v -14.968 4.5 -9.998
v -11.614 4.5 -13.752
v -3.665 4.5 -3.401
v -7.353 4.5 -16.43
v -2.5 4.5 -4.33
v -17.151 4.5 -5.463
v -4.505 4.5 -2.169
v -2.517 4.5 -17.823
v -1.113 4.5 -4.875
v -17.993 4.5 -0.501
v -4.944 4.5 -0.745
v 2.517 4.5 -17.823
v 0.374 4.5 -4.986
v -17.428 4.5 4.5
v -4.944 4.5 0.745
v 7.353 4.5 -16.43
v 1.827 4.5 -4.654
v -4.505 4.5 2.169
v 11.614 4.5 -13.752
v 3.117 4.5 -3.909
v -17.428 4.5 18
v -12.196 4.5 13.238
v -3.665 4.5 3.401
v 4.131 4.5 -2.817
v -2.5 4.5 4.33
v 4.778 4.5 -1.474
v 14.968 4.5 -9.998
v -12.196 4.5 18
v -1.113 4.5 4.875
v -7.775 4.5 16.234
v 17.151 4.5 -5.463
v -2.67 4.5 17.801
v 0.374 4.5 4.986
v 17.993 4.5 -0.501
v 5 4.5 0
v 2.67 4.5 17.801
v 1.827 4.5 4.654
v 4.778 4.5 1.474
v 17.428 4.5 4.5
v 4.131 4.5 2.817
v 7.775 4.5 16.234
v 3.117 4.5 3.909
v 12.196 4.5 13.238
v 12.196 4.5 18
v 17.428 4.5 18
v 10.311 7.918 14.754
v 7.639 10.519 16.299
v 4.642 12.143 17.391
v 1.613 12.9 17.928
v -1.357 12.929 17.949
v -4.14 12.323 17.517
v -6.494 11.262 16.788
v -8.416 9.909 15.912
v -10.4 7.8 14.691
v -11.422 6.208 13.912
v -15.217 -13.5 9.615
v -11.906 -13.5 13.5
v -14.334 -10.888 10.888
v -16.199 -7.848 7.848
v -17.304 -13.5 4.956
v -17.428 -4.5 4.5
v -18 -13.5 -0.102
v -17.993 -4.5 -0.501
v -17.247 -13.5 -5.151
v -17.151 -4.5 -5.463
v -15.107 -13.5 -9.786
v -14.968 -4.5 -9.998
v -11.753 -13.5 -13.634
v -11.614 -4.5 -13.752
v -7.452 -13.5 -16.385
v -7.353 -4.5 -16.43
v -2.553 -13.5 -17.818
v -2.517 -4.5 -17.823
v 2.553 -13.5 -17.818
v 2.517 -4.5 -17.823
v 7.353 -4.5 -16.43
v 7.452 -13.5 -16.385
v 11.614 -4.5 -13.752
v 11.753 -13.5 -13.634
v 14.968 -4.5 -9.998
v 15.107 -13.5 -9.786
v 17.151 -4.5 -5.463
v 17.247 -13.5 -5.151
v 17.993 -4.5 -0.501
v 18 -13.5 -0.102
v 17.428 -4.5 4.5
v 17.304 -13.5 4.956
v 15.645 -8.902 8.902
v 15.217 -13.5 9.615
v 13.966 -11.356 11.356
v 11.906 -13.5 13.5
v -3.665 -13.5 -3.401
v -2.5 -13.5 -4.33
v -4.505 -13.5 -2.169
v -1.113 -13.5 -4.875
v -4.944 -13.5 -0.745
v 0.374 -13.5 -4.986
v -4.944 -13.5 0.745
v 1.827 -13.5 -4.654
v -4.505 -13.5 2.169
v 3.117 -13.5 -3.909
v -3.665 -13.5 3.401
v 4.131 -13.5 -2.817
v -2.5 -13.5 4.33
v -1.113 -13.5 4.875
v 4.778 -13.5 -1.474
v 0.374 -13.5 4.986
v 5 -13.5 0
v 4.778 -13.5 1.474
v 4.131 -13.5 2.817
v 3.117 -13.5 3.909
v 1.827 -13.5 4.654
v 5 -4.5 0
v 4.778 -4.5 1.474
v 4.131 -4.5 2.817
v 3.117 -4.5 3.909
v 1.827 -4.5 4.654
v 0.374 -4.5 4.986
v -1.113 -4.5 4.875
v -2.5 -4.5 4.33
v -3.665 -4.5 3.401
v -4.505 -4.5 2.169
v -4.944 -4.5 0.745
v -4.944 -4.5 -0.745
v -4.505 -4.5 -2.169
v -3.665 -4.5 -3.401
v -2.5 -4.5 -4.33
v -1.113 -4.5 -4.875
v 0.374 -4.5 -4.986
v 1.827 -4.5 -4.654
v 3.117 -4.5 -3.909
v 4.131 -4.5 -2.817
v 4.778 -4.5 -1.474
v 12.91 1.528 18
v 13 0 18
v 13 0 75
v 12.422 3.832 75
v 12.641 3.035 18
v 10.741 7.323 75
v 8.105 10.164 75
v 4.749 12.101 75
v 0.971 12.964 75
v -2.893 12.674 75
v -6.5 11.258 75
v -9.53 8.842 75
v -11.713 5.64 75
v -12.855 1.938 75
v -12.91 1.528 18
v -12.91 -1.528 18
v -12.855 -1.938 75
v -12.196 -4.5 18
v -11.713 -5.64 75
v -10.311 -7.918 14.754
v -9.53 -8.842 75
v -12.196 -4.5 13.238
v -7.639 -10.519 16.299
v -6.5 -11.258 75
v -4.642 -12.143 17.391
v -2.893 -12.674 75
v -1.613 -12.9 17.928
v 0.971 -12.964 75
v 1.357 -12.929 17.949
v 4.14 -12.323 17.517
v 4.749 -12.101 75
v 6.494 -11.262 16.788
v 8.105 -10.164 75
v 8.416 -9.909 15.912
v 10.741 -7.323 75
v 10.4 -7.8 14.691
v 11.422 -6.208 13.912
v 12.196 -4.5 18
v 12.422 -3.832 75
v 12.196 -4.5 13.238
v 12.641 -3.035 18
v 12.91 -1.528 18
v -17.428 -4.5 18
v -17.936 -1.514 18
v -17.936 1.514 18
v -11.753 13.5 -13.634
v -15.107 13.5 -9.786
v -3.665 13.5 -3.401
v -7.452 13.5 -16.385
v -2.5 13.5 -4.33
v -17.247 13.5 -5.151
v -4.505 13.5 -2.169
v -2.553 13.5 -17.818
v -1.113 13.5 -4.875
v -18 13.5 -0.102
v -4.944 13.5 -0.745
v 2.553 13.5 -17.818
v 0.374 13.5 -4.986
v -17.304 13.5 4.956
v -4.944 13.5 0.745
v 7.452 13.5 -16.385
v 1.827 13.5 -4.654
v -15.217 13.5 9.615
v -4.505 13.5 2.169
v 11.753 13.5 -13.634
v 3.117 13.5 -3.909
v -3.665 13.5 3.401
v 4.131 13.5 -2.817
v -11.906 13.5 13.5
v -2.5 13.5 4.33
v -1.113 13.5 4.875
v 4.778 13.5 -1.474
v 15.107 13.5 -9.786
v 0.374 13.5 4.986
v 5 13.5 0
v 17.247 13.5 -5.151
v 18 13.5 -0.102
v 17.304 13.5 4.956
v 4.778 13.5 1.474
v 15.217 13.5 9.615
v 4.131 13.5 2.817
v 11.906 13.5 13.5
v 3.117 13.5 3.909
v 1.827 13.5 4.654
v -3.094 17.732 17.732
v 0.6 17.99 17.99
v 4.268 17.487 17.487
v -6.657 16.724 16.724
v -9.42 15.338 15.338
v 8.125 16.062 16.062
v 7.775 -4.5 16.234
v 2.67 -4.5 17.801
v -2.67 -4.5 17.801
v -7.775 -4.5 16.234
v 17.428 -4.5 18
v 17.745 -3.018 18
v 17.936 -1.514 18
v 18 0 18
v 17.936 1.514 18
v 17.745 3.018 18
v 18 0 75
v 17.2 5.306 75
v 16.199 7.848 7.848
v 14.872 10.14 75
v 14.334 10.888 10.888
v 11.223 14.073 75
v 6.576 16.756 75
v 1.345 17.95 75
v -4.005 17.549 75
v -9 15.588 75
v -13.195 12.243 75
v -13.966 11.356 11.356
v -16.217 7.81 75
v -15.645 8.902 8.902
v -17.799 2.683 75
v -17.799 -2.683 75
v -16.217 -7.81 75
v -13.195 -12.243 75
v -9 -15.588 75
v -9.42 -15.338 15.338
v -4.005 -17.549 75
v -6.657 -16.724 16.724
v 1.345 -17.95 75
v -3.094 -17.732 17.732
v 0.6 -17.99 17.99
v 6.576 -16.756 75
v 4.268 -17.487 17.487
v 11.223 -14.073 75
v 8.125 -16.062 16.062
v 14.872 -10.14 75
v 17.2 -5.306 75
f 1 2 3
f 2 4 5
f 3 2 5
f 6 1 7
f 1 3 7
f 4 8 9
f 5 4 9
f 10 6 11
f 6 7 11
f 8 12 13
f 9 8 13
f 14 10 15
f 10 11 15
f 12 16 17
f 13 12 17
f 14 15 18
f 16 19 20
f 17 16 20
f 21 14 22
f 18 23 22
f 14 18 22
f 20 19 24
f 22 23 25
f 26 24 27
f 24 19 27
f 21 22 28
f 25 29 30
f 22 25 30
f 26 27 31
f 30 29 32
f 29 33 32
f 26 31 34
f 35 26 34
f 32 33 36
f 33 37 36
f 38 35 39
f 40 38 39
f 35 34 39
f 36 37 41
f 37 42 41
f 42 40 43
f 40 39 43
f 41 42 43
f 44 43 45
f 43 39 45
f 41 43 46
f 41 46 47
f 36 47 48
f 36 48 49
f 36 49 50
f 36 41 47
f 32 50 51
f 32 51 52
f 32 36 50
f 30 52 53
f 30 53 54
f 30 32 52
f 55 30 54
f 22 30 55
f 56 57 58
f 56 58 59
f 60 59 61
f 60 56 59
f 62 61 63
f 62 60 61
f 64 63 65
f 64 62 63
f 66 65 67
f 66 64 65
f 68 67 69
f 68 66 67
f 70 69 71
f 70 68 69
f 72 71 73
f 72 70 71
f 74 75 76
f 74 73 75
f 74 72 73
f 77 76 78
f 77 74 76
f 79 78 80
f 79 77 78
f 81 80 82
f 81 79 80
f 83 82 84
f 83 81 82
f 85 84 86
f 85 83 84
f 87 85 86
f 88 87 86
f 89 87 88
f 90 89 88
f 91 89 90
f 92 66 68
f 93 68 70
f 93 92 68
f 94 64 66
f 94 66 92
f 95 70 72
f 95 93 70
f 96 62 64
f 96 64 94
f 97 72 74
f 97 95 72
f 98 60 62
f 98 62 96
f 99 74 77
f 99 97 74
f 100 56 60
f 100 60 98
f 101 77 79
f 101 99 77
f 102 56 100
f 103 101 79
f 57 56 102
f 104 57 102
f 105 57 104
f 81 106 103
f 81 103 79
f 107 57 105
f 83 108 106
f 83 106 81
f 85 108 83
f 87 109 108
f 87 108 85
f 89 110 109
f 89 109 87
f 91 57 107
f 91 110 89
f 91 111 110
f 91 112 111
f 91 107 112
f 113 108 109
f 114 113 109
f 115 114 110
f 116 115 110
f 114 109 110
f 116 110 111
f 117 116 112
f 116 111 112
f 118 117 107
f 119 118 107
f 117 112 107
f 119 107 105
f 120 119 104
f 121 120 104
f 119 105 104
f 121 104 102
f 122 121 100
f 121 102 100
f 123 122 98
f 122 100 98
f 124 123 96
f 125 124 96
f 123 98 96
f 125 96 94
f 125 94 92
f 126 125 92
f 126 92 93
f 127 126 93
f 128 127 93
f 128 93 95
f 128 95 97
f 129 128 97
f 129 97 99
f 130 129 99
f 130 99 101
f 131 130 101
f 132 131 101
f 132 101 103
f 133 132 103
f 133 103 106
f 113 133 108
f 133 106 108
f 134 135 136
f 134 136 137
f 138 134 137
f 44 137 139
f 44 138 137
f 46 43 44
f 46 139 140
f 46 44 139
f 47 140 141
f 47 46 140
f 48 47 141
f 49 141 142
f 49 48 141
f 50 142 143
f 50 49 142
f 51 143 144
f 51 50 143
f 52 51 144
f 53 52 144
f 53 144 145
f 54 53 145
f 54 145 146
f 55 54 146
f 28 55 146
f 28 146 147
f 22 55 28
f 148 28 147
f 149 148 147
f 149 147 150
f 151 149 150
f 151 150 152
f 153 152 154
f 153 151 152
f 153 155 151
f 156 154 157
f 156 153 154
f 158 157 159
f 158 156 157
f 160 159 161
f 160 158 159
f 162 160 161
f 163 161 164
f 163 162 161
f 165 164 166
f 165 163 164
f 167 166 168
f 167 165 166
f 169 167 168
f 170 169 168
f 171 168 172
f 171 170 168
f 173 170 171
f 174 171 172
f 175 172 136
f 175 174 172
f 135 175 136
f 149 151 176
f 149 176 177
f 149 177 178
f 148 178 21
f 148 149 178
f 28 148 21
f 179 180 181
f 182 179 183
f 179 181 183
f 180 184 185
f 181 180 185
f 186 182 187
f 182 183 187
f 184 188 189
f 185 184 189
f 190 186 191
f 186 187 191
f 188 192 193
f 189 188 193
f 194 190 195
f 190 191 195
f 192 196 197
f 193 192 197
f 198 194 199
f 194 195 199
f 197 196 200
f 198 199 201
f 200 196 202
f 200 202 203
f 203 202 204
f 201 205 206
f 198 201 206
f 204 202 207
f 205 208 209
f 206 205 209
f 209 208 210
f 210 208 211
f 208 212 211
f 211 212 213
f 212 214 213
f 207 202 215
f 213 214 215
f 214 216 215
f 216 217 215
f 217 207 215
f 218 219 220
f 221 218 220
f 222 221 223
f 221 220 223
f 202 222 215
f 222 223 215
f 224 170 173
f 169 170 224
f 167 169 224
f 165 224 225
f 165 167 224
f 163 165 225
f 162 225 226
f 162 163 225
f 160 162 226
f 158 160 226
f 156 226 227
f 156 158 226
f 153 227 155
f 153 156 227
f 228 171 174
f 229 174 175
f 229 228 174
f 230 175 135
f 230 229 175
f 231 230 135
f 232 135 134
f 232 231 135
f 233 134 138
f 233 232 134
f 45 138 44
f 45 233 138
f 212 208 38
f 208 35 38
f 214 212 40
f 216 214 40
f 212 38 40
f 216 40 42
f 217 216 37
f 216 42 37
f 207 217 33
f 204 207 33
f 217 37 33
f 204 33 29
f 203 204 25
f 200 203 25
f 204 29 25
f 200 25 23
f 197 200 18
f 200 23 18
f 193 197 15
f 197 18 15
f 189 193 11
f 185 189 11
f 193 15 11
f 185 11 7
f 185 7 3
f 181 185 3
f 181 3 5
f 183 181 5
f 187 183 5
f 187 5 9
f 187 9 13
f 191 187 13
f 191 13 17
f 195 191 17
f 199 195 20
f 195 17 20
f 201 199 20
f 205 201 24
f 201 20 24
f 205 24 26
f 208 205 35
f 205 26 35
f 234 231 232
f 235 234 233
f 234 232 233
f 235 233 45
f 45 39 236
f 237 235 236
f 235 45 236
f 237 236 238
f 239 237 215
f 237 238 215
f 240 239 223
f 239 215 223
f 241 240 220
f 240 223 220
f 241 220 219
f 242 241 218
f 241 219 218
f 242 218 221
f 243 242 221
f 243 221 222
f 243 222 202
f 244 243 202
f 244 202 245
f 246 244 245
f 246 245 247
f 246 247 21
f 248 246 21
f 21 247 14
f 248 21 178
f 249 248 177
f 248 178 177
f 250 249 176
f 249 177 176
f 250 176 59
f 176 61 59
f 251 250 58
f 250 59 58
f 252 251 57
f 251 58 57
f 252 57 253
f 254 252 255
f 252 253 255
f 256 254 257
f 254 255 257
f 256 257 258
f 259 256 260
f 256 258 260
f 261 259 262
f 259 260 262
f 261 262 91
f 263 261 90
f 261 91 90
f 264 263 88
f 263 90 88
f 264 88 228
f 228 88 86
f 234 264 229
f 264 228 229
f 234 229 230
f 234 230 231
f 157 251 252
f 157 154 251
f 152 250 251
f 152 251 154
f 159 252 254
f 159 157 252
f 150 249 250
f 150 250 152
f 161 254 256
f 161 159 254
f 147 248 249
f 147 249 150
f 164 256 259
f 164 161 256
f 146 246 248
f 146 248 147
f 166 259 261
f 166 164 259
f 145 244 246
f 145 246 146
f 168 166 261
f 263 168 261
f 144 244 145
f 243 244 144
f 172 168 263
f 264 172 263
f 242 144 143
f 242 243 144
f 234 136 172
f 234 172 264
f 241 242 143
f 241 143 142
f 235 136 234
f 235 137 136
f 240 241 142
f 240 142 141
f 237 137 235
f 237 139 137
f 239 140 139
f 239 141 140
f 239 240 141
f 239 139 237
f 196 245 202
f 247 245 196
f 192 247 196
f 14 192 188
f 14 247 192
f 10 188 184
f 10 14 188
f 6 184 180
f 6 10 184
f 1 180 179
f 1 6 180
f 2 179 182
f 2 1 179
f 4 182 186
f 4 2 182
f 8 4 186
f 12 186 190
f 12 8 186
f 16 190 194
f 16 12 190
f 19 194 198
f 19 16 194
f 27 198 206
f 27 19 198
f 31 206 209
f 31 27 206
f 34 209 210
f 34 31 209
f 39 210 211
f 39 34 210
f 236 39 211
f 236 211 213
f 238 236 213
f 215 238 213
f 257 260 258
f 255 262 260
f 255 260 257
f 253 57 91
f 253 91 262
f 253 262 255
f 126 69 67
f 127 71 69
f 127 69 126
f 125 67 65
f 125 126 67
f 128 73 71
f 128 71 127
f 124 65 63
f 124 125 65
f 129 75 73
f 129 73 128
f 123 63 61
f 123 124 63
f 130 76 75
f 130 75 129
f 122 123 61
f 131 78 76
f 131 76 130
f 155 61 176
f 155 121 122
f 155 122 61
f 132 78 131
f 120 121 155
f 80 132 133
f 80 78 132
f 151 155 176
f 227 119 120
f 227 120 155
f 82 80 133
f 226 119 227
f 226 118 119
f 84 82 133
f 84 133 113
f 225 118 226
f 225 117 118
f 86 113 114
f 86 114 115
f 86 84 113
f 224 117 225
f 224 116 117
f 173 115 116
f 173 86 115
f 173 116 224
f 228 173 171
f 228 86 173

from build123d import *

# Parameters (mm, degrees)
F0_R     = 18
F0_R_2   = 13
F1_DEPTH = 75
F2_R     = 18
F3_DEPTH = 13.5
F4_W     = 9
F4_H     = 36
F5_DEPTH = 20
F6_R     = 5
F7_DEPTH = 20
F9_DEPTH = 14.5


with BuildPart() as f1:
    # F0 (on Top) → F1 (new body)
    with BuildSketch(Plane.XY):
        Circle(F0_R)
        Circle(F0_R_2, mode=Mode.SUBTRACT)
    extrude(amount=F1_DEPTH)

    # F2 (on Front) → F3 (join, symmetric)
    with BuildSketch(Plane.XZ):
        Circle(F2_R)
    extrude(amount=F3_DEPTH, both=True)

    # F4 (on Right) → F5 (cut, symmetric)
    with BuildSketch(Plane.YZ):
        Rectangle(F4_W, F4_H)
    extrude(amount=F5_DEPTH, both=True, mode=Mode.SUBTRACT)

    # F6 (on Front) → F7 (cut, symmetric)
    with BuildSketch(Plane.XZ):
        Circle(F6_R)
    extrude(amount=F7_DEPTH, both=True, mode=Mode.SUBTRACT)

    # F8 (on Right) → F9 (cut, symmetric)
    with BuildSketch(Plane.YZ):
        Polygon((-19.372148, 0), (-13.5, 0), (-13.5, 13.5), (-19.372148, 19.372148), align=None)
        Polygon((13.5, 13.5), (13.5, 0), (19.372148, 0), (19.372148, 19.372148), align=None)
    extrude(amount=F9_DEPTH, both=True, mode=Mode.SUBTRACT)


solid = f1.part
